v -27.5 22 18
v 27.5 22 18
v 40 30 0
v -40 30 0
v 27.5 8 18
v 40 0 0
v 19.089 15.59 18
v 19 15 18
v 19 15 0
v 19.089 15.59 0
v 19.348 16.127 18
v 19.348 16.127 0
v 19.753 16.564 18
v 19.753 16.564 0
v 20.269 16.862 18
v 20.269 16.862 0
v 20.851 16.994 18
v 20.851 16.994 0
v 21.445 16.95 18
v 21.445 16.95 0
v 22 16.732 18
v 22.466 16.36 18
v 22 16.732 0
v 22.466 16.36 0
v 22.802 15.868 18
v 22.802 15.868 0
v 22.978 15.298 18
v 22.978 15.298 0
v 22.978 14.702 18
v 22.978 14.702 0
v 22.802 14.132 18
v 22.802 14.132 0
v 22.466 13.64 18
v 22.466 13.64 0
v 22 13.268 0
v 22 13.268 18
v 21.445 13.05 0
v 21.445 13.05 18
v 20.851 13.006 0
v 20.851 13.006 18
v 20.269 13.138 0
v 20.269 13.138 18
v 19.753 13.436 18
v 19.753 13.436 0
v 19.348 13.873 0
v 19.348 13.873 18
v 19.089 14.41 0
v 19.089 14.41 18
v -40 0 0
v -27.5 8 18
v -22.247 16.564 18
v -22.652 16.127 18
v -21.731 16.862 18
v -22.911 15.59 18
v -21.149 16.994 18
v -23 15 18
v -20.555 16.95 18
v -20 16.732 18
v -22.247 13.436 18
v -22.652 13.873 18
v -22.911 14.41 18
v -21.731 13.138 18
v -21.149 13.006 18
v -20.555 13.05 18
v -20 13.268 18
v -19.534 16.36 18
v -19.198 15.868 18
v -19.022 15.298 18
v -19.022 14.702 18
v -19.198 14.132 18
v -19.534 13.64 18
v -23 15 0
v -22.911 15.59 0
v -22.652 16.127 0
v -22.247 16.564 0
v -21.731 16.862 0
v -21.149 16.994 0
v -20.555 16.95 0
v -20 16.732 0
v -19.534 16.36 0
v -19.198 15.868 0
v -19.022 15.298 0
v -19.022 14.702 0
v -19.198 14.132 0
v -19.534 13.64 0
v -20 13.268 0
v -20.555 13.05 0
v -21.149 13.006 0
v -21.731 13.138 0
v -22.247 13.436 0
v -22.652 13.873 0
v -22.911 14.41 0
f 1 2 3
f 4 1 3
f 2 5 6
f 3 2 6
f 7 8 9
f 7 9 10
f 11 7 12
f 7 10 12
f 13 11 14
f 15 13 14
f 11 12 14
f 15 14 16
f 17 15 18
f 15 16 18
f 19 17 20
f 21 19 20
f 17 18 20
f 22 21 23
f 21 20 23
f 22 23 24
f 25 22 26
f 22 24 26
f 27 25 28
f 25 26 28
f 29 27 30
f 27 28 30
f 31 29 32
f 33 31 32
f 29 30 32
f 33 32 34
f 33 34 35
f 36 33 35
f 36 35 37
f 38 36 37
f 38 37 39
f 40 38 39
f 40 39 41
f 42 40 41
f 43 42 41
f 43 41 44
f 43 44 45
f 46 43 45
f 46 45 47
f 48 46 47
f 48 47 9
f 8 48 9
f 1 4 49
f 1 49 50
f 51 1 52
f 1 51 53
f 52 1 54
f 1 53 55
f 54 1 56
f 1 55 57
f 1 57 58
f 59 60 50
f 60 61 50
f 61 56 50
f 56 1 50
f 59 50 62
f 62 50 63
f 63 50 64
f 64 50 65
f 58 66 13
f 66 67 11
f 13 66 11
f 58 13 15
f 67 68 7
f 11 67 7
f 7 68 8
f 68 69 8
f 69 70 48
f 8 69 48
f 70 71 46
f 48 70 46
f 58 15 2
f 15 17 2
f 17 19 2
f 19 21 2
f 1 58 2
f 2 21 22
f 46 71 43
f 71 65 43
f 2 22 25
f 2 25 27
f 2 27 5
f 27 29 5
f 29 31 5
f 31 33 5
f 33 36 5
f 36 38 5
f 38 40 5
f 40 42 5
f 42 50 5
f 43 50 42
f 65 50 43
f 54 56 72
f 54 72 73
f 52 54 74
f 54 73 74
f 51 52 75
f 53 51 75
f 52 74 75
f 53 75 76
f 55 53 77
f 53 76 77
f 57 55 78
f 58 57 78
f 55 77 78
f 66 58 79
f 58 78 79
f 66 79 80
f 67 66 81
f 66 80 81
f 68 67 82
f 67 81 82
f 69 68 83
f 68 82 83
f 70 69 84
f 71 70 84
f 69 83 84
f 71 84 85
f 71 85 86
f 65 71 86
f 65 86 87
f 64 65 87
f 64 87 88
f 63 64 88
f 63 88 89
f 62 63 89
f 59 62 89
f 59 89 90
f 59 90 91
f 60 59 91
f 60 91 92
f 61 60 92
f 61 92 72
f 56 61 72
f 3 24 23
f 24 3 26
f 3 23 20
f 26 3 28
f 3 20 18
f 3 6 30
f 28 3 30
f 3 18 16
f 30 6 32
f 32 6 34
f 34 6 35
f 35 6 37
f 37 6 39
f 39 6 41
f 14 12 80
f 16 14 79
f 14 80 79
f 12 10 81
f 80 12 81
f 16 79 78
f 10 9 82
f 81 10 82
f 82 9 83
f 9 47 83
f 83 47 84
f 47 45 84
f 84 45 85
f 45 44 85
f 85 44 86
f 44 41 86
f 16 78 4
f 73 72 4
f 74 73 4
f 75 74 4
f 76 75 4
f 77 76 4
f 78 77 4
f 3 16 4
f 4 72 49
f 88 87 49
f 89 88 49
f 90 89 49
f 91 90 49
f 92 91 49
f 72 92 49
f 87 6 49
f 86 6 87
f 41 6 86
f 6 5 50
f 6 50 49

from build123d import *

# Parameters (mm, degrees)
DODANIE_WYCI_GNI_CIE1_DEPTH = 30
WYTNIJ_WYCI_GNI_CIE1_REACH  = 55.141
SZKIC2_R                    = 2
SFAZOWANIE1_SIZE            = 8
SFAZOWANIE1_SIZE_2          = 18
SFAZOWANIE2_SIZE            = 8
SFAZOWANIE2_SIZE_2          = 18


with BuildPart() as part:
    # Szkic1 → Dodanie-wyciągnięcie1 (new body)
    with BuildSketch(Plane(origin=(0, 0, 0), x_dir=(1, 0, 0), z_dir=(0, 1, 0))):
        Polygon((-40, 0), (-27.5, -18), (27.5, -18), (40, 0), align=None)
    extrude(amount=DODANIE_WYCI_GNI_CIE1_DEPTH)

    # Szkic2 → Wytnij-wyciągnięcie1 (cut, up to next)
    with BuildSketch(Plane(origin=(0, 0, 0), x_dir=(-1, 0, 0), z_dir=(0, 0, -1)), mode=Mode.PRIVATE) as wytnij_wyci_gni_cie1_sk1:
        with Locations((-21, 15)):
            Circle(SZKIC2_R)
    wytnij_wyci_gni_cie1_tool1 = extrude(wytnij_wyci_gni_cie1_sk1.sketch, amount=-WYTNIJ_WYCI_GNI_CIE1_REACH, mode=Mode.PRIVATE) & part.part
    # Szkic2 → Wytnij-wyciągnięcie1 (cut, up to next)
    with BuildSketch(Plane(origin=(0, 0, 0), x_dir=(-1, 0, 0), z_dir=(0, 0, -1)), mode=Mode.PRIVATE) as wytnij_wyci_gni_cie1_sk2:
        with Locations((21, 15)):
            Circle(SZKIC2_R)
    wytnij_wyci_gni_cie1_tool2 = extrude(wytnij_wyci_gni_cie1_sk2.sketch, amount=-WYTNIJ_WYCI_GNI_CIE1_REACH, mode=Mode.PRIVATE) & part.part
    add(wytnij_wyci_gni_cie1_tool1.solids().sort_by_distance((21, 15, 0))[0], mode=Mode.SUBTRACT)
    add(wytnij_wyci_gni_cie1_tool2.solids().sort_by_distance((-21, 15, 0))[0], mode=Mode.SUBTRACT)

    # Sfazowanie1
    # the kernel refuses this chamfer: 18, 8 mm, written as the material it takes off along each edge
    with BuildSketch(Plane(origin=(-74.15058918, 0, 18), x_dir=(0, 0.996867139056945, 0.0790942922619672), z_dir=(1, 0, 0))) as sfazowanie1_piece_1:
        Polygon((SFAZOWANIE1_SIZE * 0.996867139057, -SFAZOWANIE1_SIZE * 0.079094292262), (-SFAZOWANIE1_SIZE_2 * 0.079094292262, -SFAZOWANIE1_SIZE_2 * 0.996867139057), (0, 0), align=None)
    extrude(amount=148.301178361, mode=Mode.SUBTRACT)

    # Sfazowanie2
    # the kernel refuses this chamfer: 18, 8 mm, written as the material it takes off along each edge
    with BuildSketch(Plane(origin=(-74.15058918, 30, 18), x_dir=(0, -0.996867139056945, 0.0790942922619672), z_dir=(1, 0, 0))) as sfazowanie2_piece_1:
        Polygon((SFAZOWANIE2_SIZE * 0.996867139057, SFAZOWANIE2_SIZE * 0.079094292262), (-SFAZOWANIE2_SIZE_2 * 0.079094292262, SFAZOWANIE2_SIZE_2 * 0.996867139057), (0, 0), align=None)
    extrude(amount=148.301178361, mode=Mode.SUBTRACT)


solid = part.part
